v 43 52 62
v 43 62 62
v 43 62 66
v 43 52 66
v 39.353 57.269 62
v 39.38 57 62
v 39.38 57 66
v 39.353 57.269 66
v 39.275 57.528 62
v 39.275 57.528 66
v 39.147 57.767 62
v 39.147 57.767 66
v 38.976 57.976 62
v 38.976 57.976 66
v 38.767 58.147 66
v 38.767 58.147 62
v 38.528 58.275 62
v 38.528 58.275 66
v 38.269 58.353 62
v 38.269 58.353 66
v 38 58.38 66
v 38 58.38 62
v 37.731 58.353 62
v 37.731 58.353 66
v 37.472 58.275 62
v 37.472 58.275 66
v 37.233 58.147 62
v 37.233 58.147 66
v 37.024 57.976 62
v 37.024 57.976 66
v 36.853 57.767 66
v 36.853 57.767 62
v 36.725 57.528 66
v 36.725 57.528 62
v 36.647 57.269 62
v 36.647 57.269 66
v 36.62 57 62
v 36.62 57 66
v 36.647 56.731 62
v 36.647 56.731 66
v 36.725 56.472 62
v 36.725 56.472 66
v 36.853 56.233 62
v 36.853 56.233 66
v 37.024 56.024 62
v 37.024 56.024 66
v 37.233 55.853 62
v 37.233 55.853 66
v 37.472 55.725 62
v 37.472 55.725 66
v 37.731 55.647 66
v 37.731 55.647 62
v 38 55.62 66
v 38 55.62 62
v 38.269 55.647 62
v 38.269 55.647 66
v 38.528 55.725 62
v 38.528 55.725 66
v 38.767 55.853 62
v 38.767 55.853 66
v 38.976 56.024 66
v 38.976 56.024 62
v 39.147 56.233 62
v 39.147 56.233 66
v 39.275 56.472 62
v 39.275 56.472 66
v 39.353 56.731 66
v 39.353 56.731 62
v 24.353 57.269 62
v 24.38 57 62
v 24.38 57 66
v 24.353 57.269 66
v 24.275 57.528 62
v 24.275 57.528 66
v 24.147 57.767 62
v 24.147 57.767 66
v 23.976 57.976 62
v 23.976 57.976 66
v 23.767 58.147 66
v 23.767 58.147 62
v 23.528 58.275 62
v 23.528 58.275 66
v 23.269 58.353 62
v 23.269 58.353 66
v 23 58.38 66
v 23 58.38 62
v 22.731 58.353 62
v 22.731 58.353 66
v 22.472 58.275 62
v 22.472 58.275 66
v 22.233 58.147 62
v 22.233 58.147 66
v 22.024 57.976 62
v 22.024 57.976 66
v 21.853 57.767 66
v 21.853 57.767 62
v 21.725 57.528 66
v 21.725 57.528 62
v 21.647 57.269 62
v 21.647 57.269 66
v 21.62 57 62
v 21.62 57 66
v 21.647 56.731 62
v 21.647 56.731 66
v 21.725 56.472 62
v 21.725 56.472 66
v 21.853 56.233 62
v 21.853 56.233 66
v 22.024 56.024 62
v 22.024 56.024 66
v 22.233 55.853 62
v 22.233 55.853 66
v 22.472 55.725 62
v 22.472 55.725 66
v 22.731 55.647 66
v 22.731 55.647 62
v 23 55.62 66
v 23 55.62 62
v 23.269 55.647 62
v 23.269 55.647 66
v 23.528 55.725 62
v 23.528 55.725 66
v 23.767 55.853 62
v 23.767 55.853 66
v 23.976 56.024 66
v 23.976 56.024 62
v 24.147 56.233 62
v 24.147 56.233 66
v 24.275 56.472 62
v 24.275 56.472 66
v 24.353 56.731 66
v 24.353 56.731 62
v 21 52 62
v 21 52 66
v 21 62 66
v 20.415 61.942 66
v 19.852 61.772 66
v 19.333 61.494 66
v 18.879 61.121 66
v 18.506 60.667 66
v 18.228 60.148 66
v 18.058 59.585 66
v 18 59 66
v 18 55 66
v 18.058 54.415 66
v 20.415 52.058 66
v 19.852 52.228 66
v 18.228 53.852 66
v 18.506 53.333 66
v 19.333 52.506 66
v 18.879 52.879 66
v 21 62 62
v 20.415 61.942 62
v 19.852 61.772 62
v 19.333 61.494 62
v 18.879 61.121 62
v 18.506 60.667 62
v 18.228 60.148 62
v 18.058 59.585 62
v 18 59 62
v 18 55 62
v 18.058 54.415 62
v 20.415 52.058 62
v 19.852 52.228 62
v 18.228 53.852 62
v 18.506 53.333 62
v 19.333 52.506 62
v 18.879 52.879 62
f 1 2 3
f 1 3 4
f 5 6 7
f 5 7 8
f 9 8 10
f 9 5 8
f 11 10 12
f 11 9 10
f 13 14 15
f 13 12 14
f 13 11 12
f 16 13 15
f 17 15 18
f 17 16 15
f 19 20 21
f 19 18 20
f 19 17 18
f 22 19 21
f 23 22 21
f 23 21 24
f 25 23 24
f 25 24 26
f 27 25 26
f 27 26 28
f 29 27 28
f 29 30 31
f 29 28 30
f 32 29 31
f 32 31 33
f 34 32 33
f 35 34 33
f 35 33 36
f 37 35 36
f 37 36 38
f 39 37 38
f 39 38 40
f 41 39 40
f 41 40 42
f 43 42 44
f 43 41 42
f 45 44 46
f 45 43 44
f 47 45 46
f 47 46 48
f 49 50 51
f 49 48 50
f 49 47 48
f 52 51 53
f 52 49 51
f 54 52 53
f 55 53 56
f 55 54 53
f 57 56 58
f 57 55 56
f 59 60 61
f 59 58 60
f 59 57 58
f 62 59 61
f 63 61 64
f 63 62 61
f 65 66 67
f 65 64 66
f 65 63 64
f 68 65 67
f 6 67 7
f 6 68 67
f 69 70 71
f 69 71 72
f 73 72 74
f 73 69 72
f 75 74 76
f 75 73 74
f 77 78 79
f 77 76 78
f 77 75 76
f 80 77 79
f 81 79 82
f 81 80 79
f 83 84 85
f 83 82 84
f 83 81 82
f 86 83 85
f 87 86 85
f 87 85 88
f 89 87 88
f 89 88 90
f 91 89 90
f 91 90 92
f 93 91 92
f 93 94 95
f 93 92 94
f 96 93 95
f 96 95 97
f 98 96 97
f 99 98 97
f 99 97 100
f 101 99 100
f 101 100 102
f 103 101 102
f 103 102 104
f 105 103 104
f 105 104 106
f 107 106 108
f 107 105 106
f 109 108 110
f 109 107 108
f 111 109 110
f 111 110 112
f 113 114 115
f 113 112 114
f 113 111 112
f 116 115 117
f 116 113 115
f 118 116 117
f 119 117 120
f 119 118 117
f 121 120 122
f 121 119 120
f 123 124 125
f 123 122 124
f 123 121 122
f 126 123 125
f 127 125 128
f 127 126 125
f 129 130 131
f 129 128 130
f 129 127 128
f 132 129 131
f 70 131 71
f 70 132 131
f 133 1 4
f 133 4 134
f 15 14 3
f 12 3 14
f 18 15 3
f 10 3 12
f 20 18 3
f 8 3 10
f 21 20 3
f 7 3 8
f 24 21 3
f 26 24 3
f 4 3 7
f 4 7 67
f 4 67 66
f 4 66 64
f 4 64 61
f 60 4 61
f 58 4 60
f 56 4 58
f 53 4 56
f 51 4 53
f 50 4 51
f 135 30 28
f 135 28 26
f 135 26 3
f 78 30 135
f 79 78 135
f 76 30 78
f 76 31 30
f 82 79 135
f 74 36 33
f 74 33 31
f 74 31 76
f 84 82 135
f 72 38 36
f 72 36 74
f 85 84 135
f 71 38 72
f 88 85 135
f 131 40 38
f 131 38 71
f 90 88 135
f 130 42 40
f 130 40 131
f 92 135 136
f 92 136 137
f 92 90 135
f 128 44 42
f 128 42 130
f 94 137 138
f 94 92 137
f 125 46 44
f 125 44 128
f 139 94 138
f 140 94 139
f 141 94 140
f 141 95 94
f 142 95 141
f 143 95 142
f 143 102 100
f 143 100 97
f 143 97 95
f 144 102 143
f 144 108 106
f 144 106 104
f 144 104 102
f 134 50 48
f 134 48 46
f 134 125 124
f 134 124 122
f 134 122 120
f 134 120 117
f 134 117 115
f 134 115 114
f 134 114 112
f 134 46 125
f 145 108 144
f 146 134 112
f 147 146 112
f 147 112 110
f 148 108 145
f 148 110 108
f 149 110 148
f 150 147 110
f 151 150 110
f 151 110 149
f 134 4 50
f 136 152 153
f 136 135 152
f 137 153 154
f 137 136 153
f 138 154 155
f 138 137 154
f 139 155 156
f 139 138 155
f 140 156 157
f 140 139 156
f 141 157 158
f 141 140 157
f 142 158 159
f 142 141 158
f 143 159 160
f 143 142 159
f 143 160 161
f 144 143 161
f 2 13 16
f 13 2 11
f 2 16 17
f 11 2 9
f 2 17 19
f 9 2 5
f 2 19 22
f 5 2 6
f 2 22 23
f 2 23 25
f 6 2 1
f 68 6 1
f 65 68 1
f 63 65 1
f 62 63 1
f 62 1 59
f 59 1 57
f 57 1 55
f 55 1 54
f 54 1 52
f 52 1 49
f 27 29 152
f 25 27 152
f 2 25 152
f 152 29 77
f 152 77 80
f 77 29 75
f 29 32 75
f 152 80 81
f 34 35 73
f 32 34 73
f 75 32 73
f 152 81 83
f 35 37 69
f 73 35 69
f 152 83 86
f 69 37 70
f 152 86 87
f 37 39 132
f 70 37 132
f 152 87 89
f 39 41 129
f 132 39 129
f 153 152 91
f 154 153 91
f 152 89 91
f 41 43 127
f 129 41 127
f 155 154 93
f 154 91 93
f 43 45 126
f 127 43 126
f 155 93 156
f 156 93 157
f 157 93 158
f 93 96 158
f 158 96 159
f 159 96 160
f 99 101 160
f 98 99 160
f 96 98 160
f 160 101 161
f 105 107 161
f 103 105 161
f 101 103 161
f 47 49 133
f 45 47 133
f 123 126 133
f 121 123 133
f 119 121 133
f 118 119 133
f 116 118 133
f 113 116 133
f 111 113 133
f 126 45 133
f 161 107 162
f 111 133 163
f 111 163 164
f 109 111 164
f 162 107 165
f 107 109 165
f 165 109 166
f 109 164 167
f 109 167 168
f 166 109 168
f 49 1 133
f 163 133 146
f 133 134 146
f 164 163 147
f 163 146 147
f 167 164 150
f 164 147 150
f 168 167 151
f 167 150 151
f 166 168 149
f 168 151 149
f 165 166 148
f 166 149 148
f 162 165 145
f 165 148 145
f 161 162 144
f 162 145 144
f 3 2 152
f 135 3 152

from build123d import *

# Parameters (mm, degrees)
CYLINDER043_R     = 1.38
CYLINDER043_DEPTH = 10
CYLINDER042_R     = 1.38
CYLINDER042_DEPTH = 10
BOX025_W          = 25
BOX025_H          = 10
BOX025_DEPTH      = 4
FILLET_R          = 3


with BuildPart() as cylinder043:
    # Cylinder043 → Cylinder043 (new body)
    with BuildSketch(Plane(origin=(25, 52, 59), x_dir=(1, 0, 0), z_dir=(0, 0, 1))):
        Circle(CYLINDER043_R)
    extrude(amount=CYLINDER043_DEPTH)


with BuildPart() as cylinder042:
    # Cylinder042 → Cylinder042 (new body)
    with BuildSketch(Plane(origin=(40, 52, 59), x_dir=(1, 0, 0), z_dir=(0, 0, 1))):
        Circle(CYLINDER042_R)
    extrude(amount=CYLINDER042_DEPTH)


with BuildPart() as fillet_body:
    # Box025 → Box025 (new body)
    with BuildSketch(Plane(origin=(45, 57, 62), x_dir=(-1, 0, 0), z_dir=(0, 0, 1))):
        with Locations((12.5, 5)):
            Rectangle(BOX025_W, BOX025_H)
    extrude(amount=BOX025_DEPTH)

    # Cut022: cut Cylinder042
    add(cylinder042.part, mode=Mode.SUBTRACT)

    # Cut023: cut Cylinder043
    add(cylinder043.part, mode=Mode.SUBTRACT)

    # Fillet
    fillet_edges = [fillet_body.edges().sort_by_distance(p)[0] for p in [
        (20, 57, 64),
        (20, 47, 64),
    ]]
    fillet(fillet_edges, radius=FILLET_R)


with BuildPart() as fillet_body_1:
    # Fillet placement: moved
    add(fillet_body.part.moved(Location((-2, 5, 0))))


solid = fillet_body_1.part
